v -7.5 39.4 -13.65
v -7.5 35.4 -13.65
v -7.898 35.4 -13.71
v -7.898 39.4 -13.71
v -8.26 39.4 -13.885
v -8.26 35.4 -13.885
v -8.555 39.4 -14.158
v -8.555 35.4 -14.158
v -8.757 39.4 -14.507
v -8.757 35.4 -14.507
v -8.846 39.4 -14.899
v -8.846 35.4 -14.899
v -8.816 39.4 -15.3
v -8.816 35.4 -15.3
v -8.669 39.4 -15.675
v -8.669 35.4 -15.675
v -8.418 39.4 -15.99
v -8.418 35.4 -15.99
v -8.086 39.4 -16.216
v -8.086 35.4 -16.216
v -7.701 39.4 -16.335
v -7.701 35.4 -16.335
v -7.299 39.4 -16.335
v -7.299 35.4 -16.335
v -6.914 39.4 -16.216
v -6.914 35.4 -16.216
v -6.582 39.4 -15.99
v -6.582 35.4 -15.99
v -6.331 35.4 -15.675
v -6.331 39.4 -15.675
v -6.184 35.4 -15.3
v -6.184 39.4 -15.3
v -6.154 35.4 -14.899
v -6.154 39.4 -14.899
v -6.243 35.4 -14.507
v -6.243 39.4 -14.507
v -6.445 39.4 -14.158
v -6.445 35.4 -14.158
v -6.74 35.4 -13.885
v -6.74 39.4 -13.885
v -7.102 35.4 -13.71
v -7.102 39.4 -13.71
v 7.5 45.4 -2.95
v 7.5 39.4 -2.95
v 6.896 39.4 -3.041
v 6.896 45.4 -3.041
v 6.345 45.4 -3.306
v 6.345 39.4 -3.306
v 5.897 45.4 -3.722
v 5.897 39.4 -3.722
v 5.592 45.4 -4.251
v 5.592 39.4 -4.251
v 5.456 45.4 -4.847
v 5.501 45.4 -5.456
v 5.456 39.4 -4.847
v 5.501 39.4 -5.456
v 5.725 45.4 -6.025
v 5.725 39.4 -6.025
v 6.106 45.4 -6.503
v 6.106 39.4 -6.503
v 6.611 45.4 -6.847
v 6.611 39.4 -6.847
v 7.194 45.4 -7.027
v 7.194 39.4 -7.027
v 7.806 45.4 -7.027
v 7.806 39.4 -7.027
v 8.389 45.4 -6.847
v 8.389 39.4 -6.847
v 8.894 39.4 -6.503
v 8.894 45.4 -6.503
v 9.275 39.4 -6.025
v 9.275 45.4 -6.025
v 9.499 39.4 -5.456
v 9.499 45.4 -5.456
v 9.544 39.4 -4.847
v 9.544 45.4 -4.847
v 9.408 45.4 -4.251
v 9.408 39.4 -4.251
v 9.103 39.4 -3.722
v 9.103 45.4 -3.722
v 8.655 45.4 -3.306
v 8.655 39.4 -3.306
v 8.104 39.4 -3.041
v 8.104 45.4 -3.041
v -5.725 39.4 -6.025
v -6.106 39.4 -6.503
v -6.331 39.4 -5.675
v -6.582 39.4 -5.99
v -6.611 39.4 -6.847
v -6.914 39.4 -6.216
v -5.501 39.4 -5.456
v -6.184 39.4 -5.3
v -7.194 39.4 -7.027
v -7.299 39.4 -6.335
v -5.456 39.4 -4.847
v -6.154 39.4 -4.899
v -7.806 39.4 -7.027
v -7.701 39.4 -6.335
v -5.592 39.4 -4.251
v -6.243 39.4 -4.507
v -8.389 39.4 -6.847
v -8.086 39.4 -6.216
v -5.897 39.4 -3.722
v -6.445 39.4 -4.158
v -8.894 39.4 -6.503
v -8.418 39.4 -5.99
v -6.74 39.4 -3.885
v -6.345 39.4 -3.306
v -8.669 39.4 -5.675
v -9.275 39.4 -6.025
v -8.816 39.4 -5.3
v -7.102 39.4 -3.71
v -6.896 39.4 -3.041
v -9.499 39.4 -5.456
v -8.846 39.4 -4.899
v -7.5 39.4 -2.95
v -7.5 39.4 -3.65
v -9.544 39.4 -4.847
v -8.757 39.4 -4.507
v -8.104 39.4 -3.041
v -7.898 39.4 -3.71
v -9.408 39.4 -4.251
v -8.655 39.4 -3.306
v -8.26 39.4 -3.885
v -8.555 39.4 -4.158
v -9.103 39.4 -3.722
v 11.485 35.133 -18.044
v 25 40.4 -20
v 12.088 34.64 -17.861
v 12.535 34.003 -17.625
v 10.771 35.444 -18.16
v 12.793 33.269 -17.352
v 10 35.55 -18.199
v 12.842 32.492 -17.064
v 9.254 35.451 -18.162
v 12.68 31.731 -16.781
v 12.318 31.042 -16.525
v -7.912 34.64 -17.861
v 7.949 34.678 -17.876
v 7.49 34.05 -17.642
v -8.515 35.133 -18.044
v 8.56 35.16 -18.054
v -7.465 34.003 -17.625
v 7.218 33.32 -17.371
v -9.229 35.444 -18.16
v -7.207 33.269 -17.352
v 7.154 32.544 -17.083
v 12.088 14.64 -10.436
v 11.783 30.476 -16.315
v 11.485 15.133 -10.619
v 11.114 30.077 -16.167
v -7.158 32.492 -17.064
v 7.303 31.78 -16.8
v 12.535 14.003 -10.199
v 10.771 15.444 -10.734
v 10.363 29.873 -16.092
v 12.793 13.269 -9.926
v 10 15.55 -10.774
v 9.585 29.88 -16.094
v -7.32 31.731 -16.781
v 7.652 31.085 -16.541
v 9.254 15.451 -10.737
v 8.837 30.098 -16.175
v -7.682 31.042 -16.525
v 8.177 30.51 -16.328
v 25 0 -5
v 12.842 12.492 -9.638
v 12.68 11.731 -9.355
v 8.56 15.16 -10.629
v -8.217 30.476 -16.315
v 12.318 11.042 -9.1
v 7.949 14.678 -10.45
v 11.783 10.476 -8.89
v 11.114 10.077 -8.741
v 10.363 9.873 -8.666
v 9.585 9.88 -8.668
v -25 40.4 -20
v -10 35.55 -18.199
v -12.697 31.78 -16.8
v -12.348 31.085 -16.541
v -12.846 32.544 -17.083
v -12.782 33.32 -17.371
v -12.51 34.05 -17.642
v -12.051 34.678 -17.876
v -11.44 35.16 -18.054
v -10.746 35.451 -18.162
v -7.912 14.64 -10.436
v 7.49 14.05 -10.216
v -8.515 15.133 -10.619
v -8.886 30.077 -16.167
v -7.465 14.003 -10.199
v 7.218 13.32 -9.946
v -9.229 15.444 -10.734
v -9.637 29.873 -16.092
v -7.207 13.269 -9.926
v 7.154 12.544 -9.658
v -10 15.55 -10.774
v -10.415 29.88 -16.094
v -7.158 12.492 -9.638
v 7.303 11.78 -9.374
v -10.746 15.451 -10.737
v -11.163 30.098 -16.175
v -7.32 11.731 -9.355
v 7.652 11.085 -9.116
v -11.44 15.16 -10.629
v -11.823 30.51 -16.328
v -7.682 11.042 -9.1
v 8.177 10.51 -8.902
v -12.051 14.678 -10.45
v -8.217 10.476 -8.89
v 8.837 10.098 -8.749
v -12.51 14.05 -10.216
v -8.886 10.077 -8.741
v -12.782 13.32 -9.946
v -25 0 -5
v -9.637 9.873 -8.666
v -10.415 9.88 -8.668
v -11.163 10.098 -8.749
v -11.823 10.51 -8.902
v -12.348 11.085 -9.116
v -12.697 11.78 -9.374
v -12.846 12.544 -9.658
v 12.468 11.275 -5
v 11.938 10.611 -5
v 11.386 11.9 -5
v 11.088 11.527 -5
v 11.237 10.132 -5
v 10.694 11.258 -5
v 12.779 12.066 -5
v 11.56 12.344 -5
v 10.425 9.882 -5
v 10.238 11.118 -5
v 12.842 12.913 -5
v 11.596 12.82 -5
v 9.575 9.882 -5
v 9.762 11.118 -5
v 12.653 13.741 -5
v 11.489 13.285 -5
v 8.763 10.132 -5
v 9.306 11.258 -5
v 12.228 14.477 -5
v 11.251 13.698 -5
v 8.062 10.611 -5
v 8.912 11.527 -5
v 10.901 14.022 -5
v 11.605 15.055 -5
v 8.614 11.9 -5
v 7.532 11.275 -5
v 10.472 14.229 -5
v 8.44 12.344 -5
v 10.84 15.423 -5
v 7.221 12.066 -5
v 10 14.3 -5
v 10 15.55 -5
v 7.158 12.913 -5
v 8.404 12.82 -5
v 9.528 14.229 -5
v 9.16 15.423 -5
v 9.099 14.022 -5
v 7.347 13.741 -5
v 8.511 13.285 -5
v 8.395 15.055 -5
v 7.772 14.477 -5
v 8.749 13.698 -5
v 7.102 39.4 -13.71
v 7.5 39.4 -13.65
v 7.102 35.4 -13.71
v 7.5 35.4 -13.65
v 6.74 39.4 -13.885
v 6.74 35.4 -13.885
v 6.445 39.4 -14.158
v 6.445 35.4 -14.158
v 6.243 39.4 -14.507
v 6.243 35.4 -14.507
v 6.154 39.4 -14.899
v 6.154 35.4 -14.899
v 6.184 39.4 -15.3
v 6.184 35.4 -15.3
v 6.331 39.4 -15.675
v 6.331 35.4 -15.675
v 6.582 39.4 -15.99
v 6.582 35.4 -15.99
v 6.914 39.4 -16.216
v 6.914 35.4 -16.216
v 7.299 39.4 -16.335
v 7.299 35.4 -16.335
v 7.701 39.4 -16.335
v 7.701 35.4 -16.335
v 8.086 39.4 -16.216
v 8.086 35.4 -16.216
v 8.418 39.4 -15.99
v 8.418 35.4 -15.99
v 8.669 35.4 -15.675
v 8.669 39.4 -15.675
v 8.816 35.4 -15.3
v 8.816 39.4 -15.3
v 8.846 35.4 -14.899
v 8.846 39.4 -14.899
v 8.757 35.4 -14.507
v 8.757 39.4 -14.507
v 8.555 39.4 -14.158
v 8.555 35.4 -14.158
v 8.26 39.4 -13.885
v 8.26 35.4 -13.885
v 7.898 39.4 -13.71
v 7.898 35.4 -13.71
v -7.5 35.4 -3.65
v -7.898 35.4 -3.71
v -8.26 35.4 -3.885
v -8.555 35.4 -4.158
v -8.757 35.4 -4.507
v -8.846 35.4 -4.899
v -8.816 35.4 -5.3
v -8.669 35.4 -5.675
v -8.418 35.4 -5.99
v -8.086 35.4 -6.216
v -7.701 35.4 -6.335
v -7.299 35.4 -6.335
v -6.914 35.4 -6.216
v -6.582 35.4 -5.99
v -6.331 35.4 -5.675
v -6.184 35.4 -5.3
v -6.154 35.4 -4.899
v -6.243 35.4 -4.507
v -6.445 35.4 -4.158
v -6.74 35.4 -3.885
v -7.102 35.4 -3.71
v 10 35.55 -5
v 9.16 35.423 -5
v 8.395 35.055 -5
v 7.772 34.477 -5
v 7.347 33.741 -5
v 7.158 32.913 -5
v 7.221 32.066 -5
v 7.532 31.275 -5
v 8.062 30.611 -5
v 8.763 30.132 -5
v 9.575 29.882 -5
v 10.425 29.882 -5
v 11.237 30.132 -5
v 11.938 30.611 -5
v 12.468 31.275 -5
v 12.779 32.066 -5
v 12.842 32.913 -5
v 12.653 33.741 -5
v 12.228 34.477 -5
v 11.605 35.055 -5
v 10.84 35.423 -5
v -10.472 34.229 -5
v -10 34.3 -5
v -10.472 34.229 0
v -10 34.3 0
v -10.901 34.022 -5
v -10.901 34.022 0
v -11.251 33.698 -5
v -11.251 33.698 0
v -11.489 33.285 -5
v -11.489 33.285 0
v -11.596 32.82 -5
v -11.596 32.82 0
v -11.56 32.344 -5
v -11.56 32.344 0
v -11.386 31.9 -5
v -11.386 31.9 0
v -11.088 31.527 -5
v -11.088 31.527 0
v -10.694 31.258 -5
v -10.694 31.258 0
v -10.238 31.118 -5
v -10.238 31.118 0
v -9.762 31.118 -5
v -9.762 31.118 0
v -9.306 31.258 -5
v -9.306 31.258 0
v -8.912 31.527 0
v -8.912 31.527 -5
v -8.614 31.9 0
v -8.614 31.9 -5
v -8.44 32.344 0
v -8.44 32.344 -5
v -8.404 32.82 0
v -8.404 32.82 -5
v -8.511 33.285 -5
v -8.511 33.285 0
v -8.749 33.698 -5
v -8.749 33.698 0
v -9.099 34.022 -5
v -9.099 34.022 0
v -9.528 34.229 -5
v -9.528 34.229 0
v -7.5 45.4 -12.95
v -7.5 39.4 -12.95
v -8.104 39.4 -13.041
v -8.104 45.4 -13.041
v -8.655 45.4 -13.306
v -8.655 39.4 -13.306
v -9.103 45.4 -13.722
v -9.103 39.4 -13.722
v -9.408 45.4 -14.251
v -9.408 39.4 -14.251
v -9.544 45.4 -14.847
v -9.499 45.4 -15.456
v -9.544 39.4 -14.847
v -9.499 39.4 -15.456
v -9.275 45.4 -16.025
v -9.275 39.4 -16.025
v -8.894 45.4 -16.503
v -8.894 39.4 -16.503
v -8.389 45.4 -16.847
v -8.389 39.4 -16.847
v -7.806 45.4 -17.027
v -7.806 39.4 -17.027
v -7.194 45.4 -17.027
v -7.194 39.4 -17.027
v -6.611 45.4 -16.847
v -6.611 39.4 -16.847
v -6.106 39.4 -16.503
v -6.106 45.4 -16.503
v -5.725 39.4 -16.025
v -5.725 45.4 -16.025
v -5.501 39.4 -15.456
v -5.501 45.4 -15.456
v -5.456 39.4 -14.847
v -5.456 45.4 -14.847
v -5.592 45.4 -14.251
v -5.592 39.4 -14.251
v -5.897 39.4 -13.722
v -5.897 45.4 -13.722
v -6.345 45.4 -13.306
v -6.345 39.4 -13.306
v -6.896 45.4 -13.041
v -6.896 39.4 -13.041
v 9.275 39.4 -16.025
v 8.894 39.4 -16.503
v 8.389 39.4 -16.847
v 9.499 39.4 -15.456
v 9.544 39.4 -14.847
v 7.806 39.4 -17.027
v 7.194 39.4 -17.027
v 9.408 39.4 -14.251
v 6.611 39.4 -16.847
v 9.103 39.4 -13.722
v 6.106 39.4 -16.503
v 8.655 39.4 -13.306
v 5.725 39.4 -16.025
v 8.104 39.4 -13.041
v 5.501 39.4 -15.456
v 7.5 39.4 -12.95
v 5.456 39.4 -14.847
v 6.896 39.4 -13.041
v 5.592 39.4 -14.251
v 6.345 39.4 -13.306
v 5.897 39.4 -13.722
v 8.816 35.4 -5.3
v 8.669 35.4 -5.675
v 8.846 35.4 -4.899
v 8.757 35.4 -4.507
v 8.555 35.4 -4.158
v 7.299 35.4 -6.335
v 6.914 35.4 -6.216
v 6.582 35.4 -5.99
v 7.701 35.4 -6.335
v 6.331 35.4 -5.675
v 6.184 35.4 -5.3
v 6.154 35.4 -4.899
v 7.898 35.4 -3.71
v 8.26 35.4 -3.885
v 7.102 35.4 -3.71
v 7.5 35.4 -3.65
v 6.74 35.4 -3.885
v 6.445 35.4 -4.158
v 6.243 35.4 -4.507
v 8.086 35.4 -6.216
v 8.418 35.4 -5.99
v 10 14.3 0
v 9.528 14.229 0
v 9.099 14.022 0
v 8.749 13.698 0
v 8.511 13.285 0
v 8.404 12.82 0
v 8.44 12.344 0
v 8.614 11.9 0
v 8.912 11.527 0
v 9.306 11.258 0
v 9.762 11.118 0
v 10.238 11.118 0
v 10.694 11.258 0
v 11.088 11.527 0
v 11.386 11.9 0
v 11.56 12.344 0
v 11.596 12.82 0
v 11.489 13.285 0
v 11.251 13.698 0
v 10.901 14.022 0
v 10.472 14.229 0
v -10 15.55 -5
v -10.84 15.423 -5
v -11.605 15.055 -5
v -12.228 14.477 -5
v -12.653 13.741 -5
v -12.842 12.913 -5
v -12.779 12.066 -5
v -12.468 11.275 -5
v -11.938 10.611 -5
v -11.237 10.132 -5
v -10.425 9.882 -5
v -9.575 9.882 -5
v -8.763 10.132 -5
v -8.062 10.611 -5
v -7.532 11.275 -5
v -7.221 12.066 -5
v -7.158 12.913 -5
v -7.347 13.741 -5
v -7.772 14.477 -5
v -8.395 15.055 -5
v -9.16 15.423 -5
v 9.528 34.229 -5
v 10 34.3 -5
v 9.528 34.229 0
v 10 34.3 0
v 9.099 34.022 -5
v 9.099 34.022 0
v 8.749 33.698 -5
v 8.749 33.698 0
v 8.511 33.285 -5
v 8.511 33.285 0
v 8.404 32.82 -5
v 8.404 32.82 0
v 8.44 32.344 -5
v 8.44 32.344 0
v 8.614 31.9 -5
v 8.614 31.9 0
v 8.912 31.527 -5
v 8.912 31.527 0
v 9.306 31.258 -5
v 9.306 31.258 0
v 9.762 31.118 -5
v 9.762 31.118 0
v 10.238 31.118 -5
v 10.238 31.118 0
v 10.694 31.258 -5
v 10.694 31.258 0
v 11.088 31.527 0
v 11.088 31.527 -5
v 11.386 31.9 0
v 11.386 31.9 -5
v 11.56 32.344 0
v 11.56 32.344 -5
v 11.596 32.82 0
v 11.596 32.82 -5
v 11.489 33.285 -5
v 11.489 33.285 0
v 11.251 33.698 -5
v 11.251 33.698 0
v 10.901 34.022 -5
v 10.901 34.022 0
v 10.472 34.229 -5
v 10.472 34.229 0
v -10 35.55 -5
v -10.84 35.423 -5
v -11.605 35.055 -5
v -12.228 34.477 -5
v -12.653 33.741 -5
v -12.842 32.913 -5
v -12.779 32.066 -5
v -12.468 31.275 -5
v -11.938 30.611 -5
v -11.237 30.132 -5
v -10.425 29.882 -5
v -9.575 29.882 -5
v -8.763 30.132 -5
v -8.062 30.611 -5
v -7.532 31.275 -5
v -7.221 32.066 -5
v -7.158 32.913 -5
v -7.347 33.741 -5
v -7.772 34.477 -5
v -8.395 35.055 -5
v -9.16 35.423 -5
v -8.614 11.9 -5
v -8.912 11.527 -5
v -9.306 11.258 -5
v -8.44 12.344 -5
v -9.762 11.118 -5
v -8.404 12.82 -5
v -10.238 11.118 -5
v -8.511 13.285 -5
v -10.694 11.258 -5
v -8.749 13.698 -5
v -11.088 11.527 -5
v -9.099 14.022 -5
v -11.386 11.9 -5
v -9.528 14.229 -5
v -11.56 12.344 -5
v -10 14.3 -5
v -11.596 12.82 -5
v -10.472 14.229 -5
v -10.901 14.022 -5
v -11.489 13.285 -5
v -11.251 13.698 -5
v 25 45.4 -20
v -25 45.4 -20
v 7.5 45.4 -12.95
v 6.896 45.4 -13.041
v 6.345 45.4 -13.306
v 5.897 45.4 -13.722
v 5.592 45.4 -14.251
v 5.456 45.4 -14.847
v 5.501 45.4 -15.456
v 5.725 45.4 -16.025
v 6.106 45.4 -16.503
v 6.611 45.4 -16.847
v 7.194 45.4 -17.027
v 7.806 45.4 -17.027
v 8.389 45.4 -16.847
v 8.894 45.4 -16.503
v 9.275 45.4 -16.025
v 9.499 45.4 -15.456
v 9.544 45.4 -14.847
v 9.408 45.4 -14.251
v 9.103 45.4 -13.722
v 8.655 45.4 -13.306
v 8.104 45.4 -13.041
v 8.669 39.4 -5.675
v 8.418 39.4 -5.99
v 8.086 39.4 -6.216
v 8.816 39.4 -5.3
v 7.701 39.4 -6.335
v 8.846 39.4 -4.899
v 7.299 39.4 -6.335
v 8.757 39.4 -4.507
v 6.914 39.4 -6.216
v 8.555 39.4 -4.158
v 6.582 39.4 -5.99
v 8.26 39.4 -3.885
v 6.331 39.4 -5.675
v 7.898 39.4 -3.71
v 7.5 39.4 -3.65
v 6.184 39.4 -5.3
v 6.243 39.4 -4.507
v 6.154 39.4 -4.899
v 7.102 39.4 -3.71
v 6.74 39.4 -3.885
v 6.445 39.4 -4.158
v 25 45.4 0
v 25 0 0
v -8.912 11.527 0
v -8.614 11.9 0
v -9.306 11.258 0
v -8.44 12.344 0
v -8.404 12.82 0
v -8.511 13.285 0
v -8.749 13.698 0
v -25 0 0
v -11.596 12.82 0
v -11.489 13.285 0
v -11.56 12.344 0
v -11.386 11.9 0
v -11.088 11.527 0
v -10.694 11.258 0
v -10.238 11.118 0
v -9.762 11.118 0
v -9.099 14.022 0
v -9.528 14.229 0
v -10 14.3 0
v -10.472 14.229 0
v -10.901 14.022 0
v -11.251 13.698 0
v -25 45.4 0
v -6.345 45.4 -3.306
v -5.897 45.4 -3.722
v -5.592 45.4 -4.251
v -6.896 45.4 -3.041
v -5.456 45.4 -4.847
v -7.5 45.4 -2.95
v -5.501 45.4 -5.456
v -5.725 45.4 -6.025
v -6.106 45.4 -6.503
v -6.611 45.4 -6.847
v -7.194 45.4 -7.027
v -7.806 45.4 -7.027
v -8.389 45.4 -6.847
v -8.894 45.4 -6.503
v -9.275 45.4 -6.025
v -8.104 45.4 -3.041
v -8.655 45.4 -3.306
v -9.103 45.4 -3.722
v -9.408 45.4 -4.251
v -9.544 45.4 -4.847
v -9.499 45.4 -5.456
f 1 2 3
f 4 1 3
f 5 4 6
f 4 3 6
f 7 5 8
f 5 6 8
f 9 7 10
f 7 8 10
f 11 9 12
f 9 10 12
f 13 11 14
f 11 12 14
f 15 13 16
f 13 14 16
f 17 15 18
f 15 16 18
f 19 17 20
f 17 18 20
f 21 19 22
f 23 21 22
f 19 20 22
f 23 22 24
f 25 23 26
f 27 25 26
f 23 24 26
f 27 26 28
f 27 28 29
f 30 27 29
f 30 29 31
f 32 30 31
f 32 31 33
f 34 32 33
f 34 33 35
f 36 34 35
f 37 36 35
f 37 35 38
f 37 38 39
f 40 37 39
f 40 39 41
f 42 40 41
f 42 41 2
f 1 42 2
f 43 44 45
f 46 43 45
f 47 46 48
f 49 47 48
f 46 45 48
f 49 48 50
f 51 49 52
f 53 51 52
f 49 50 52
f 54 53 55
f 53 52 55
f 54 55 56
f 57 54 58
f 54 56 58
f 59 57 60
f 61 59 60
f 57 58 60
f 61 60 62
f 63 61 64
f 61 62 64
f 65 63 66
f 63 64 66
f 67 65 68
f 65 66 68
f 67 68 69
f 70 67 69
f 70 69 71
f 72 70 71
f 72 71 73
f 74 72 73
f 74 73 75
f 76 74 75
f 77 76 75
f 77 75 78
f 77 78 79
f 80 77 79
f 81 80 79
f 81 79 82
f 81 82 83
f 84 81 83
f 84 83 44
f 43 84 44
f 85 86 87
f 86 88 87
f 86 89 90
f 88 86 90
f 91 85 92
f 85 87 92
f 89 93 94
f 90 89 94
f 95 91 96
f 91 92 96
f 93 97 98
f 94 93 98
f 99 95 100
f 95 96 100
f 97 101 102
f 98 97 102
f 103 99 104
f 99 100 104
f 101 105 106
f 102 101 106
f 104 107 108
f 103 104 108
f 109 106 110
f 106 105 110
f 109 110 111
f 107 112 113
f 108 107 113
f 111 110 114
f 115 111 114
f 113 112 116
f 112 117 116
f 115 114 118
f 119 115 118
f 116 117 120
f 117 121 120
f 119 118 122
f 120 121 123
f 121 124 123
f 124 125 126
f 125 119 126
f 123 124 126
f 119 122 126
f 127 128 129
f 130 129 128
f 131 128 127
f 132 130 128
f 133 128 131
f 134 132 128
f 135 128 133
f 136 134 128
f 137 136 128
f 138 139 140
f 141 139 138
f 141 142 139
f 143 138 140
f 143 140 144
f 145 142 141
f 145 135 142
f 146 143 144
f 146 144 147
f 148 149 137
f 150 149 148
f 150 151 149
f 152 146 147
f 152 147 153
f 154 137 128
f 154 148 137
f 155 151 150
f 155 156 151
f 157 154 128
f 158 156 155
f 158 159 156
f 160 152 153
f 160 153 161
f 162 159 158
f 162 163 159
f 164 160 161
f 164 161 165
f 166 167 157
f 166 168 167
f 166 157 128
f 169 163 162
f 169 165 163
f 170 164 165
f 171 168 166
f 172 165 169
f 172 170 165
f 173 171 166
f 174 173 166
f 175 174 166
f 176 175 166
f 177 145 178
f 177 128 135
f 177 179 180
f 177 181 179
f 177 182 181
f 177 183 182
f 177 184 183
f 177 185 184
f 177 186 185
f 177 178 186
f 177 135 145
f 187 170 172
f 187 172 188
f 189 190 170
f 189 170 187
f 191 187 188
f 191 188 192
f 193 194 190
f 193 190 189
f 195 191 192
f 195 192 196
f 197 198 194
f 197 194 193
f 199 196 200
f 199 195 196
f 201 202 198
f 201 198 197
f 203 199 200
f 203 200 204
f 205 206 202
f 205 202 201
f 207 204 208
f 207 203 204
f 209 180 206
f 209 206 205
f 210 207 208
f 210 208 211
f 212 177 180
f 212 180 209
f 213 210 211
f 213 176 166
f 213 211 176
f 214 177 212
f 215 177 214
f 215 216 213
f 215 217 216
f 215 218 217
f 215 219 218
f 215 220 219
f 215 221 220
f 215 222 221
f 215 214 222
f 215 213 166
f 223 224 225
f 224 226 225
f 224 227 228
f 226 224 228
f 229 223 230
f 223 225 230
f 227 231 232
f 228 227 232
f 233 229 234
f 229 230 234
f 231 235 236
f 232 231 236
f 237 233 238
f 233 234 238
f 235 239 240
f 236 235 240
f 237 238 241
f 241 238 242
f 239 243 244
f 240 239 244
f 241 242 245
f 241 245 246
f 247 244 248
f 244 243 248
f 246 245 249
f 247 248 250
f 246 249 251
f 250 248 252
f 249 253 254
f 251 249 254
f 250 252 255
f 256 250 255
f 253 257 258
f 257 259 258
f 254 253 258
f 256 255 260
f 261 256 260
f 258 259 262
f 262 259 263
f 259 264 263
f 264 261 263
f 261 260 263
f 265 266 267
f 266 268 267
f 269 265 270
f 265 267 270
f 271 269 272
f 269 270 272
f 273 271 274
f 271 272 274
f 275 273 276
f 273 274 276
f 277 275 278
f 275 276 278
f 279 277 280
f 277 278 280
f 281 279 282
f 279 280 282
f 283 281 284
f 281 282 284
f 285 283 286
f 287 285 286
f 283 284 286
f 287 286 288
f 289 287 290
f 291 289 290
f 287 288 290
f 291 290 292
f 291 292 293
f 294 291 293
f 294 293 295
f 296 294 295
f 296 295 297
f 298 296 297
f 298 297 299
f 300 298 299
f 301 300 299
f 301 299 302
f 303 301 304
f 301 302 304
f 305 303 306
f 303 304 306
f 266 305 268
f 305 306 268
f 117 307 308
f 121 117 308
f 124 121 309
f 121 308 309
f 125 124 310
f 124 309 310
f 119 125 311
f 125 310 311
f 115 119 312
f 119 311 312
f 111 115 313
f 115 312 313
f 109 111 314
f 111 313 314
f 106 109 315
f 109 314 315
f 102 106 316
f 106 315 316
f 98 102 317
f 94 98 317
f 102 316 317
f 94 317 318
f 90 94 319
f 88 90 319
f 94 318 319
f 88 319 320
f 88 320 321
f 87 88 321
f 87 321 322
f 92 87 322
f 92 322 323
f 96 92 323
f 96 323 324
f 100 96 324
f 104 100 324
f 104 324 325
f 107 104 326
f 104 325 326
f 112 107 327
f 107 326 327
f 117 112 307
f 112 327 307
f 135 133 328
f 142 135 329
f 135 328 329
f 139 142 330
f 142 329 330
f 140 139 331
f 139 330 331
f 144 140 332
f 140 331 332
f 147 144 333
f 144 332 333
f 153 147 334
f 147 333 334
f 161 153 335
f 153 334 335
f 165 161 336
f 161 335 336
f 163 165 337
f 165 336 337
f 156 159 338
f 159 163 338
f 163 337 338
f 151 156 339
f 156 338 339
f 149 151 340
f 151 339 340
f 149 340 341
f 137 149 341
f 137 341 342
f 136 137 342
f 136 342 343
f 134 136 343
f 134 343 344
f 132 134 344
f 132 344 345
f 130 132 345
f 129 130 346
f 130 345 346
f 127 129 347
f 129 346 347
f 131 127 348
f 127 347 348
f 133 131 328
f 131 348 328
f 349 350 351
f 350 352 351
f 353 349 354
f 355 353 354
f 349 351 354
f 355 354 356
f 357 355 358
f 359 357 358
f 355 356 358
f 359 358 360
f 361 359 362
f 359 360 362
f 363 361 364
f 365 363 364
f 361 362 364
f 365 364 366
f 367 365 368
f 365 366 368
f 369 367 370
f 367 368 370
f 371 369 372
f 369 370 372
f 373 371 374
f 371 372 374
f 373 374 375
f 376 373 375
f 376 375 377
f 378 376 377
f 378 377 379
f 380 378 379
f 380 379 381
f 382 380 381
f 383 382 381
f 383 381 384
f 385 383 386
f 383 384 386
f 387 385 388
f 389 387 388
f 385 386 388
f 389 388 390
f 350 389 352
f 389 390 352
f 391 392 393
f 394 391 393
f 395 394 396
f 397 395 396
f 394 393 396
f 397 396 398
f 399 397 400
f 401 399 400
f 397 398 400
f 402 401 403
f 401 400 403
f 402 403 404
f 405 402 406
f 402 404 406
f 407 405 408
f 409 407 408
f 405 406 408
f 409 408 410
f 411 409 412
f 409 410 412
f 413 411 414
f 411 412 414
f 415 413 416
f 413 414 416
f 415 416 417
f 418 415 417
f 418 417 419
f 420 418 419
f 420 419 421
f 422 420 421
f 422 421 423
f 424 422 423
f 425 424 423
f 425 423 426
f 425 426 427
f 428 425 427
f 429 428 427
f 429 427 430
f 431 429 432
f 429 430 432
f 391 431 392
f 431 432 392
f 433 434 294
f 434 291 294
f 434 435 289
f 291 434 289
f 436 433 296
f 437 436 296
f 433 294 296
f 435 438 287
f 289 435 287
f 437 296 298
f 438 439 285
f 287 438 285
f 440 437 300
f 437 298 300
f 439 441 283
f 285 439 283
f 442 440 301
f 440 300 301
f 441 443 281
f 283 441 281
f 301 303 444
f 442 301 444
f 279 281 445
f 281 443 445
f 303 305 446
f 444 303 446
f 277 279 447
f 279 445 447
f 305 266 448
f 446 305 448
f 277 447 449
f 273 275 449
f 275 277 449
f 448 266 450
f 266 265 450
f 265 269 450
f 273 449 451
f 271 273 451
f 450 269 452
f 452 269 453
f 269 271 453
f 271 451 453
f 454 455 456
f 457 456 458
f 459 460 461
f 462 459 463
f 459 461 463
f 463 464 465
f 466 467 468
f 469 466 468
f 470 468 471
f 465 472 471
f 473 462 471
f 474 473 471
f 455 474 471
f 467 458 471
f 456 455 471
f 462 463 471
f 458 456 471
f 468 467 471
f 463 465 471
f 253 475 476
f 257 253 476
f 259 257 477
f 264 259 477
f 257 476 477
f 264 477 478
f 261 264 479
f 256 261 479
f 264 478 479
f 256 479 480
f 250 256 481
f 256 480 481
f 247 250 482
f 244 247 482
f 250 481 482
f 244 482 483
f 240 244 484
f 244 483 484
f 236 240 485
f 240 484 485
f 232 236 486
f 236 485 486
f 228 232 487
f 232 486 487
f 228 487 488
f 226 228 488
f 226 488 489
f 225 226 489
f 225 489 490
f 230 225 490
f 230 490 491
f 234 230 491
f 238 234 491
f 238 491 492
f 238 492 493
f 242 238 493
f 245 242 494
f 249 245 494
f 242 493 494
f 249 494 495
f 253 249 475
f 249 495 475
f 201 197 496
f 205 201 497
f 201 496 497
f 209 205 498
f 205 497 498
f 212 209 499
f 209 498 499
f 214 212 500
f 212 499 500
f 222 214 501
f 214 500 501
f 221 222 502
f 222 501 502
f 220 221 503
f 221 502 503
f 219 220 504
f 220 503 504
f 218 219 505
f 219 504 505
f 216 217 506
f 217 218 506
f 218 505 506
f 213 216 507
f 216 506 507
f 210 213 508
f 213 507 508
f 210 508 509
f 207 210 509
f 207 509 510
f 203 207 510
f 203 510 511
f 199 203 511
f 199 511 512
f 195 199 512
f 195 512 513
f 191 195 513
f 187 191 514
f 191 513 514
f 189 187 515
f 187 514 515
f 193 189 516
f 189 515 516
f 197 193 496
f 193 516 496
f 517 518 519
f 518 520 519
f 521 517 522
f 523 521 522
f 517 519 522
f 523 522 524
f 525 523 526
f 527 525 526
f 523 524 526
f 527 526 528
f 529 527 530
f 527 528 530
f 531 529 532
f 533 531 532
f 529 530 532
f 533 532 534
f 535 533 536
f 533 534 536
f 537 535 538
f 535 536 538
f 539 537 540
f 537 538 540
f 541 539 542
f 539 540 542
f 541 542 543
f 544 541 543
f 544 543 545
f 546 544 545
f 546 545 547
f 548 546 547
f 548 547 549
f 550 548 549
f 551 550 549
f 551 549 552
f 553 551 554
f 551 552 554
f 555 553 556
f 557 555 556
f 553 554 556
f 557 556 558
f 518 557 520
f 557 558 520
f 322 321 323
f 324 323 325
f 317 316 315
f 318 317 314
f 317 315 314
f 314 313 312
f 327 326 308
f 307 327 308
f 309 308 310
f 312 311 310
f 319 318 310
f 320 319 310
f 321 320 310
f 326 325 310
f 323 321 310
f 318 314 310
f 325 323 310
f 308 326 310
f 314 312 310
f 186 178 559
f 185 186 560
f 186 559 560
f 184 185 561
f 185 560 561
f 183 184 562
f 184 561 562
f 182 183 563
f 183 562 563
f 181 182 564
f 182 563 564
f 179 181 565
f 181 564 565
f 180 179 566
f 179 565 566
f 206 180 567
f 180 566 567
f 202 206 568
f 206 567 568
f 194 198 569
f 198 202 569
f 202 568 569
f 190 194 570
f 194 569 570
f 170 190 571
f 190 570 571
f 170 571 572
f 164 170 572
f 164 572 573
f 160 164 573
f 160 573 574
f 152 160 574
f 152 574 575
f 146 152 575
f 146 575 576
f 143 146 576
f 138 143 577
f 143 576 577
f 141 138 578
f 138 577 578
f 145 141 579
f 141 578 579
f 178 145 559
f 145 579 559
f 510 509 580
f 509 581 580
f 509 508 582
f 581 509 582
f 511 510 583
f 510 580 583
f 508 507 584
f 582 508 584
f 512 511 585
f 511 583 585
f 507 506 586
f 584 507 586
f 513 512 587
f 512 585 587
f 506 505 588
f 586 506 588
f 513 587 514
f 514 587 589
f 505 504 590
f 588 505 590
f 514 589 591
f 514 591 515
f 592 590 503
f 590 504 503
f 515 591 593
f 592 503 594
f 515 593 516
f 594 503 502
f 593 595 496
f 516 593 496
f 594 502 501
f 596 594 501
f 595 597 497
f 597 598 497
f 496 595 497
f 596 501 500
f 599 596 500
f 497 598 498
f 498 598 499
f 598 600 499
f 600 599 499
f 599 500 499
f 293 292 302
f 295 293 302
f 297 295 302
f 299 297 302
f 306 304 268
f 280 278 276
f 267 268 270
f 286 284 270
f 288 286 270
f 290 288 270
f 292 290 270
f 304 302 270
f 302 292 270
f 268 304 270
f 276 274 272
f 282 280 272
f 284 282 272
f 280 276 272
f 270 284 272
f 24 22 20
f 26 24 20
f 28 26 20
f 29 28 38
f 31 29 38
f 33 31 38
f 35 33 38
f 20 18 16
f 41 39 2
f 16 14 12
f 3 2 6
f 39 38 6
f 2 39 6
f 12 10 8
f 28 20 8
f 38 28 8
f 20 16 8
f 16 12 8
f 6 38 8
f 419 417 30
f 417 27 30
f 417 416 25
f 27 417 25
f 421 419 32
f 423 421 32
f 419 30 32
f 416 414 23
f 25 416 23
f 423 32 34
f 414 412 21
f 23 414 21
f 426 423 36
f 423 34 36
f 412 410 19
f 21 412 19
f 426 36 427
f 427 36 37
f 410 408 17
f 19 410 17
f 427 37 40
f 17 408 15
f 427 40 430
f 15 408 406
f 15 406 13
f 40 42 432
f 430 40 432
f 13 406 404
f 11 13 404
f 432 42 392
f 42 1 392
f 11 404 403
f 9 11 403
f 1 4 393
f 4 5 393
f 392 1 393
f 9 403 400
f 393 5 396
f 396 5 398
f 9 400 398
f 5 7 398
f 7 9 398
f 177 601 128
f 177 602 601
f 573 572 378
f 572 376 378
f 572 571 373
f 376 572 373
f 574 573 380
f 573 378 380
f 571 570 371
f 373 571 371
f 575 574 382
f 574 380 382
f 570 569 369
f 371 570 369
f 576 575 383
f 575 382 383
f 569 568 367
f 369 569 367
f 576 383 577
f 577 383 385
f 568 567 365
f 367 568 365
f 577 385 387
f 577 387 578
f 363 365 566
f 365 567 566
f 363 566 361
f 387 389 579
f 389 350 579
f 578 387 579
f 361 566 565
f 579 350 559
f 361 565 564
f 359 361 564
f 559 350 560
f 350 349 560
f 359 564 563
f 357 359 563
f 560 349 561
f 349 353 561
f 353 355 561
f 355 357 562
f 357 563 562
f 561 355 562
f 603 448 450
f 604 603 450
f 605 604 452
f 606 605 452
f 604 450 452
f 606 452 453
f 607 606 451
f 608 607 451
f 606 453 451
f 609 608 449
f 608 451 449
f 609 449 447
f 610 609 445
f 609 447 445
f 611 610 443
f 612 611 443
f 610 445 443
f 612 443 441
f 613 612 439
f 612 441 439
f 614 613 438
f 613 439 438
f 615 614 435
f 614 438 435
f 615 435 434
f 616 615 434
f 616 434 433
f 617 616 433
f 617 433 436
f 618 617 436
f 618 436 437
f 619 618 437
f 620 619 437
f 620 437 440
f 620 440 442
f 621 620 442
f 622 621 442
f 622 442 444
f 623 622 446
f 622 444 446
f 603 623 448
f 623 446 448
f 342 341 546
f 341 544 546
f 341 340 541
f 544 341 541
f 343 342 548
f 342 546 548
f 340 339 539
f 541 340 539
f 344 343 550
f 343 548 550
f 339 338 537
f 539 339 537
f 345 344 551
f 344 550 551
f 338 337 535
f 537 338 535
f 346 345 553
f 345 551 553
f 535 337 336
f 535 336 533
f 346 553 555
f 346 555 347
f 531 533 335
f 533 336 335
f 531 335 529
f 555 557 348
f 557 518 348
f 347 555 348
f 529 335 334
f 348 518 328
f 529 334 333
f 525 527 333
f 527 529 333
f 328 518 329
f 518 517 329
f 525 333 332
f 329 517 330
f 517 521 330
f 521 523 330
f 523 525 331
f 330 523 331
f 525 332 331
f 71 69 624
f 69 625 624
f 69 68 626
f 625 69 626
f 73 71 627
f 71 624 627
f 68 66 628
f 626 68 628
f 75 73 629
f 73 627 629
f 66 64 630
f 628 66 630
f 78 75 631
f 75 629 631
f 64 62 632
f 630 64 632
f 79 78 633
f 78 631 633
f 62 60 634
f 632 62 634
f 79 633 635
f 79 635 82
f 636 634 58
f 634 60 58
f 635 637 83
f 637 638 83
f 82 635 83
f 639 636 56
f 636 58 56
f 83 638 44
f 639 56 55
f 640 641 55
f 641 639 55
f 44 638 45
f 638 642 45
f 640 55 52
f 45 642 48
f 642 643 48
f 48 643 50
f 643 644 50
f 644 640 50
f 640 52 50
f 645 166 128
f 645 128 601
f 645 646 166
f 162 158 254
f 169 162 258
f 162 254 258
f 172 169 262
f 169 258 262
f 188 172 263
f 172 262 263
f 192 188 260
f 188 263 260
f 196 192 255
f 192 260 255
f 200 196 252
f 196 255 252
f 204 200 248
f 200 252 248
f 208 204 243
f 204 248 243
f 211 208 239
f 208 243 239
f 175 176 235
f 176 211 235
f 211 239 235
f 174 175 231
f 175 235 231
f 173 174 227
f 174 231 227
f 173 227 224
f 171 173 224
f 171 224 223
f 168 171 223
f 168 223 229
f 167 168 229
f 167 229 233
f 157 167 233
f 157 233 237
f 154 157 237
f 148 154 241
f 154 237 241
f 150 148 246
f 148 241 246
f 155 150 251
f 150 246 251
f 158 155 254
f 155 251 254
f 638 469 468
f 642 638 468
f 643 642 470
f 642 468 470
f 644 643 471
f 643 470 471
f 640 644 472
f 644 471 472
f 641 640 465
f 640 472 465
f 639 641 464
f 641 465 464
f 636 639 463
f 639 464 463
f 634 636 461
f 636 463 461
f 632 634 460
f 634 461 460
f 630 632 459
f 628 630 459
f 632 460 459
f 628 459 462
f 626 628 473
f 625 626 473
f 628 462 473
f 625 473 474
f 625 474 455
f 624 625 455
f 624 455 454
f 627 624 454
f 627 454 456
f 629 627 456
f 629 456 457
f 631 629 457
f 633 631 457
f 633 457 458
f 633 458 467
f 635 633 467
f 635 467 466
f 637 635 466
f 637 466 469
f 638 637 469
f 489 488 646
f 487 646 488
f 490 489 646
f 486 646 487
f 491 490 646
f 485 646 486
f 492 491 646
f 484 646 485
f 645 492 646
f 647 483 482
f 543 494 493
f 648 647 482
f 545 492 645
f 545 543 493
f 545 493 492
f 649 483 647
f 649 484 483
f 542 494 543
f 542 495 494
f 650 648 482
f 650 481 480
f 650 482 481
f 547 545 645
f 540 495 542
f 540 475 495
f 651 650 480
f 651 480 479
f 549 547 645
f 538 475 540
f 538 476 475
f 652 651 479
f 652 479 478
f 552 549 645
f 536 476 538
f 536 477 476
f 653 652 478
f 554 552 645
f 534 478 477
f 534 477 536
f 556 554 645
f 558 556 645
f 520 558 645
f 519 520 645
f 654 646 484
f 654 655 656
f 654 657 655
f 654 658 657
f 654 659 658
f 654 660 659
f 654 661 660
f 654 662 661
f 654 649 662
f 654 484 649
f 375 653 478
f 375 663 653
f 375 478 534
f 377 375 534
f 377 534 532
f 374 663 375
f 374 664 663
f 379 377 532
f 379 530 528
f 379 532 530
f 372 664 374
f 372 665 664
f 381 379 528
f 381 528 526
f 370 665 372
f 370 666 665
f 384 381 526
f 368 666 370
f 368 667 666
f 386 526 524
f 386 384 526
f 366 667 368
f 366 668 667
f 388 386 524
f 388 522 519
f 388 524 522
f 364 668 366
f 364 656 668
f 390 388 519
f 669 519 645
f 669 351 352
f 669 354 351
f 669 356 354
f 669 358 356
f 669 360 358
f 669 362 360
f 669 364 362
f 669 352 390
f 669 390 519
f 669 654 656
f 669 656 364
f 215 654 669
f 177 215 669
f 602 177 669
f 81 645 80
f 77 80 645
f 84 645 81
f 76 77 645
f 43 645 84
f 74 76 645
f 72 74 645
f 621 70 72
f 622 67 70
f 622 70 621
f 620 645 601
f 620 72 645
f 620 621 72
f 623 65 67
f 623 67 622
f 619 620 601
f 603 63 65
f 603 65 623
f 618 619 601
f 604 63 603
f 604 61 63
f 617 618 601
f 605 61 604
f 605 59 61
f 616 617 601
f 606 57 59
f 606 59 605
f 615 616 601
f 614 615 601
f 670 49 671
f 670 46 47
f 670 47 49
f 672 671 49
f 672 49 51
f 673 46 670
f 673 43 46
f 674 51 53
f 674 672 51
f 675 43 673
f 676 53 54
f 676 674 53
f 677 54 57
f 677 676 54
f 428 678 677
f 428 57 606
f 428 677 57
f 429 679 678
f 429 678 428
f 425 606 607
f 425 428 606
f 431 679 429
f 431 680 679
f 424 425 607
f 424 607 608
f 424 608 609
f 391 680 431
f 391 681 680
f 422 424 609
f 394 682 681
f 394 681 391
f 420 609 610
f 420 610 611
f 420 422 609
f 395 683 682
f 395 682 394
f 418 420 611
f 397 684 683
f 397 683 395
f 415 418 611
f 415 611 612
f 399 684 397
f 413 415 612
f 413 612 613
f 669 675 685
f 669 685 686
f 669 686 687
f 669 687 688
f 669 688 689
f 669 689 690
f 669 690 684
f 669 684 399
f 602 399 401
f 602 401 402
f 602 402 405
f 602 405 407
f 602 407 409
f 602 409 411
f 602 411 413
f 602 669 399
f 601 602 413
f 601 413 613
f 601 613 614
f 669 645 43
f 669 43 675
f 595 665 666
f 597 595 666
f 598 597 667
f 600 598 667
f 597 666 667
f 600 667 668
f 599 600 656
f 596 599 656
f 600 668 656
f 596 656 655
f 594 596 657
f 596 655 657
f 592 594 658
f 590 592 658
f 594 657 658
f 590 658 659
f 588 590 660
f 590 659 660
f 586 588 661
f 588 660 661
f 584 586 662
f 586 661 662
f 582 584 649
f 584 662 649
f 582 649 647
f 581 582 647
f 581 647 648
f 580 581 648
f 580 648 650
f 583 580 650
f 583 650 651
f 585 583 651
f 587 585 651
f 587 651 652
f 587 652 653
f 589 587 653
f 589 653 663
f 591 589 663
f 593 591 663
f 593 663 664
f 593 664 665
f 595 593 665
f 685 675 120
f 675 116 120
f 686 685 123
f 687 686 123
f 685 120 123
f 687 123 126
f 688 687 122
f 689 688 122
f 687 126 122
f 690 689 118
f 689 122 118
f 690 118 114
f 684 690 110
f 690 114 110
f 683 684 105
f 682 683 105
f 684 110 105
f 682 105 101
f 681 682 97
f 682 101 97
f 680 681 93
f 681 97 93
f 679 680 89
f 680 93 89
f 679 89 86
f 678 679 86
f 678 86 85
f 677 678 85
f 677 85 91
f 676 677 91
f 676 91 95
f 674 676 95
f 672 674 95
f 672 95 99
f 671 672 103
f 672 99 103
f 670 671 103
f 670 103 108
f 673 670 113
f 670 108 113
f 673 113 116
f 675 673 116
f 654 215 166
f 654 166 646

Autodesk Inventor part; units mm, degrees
ref_plane "YZ Plane" through (0, 0, 0) normal (1, 0, 0) x (0, 1, 0)
ref_plane "XZ Plane" through (0, 0, 0) normal (0, 1, 0) x (-1, 0, 0)
ref_plane "XY Plane" through (0, 0, 0) normal (0, 0, 1) x (1, 0, 0)
sketch "草圖1" plane through (0, 0, 0) normal (1, 0, 0) x (0, 1, 0)
  line L0 (0, 0) -> (45.4, 0)
  line L1 (45.4, 0) -> (45.4, -20)
  line L2 (45.4, -20) -> (40.4, -20)
  line L3 (40.4, -20) -> (0, -5)
  line L4 (0, -5) -> (0, 0)
  dimension "d0" = 45.4
  dimension "d1" = 20
  dimension "d2" = 5
  dimension "d3" = 5
extrude "擠出1" add sketch "草圖1" along normal mid plane 50
sketch "草圖2" plane through (25, 45.4, -20) normal (0, 0, -1) x (-1, 0, 0)
  line L0 (15, -12.7) -> (35, -12.7)
  line L1 (35, -12.7) -> (35, -32.7)
  line L2 (35, -32.7) -> (15, -32.7)
  line L3 (15, -32.7) -> (15, -12.7)
  line L4 (15, -12.7) -> (35, -32.7) construction
  line L5 (35, -12.7) -> (15, -32.7) construction
  line L6 (0, 0) -> (0, -45.4) projected
  point P0 (25, -45.4)
  point P1 (25, -22.7)
  point P2 (25, -22.7)
  point P3 (25, -22.7)
  point P4 (0, -22.7)
  dimension "d6" = 20
  dimension "d7" = 20
hole "孔1" at (10, 32.7, -20) at (10, 12.7, -20) at (-10, 12.7, -20) at (-10, 32.7, -20) direction (0, 0, 1) diameter 3.2 end through all counterbore diameter 5.7 counterbore depth 15
sketch "草圖3" plane through (-25, 45.4, 0) normal (0, 1, 0) x (1, 0, 0)
  line L0 (32.5, 15) -> (17.5, 15)
  line L1 (17.5, 15) -> (17.5, 5)
  line L2 (17.5, 5) -> (32.5, 5)
  line L3 (32.5, 5) -> (32.5, 15)
  line L4 (32.5, 15) -> (17.5, 5) construction
  line L5 (17.5, 15) -> (32.5, 5) construction
  line L6 (0, 0) -> (0, 20) projected
  line L7 (0, 20) -> (50, 20) projected
  point P0 (25, 0)
  point P1 (25, 10)
  point P2 (25, 10)
  point P3 (0, 10)
  point P4 (25, 10)
  point P5 (25, 20)
  dimension "d15" = 15
  dimension "d16" = 10
hole "孔2" at (7.5, 45.4, -5) at (-7.5, 45.4, -5) at (-7.5, 45.4, -15) at (7.5, 45.4, -15) direction (0, -1, 0) diameter 2.7 depth 10 counterbore diameter 4.1 counterbore depth 6
equation "\"d3\" = d2"
properties part number "線性滑塊轉接器"
